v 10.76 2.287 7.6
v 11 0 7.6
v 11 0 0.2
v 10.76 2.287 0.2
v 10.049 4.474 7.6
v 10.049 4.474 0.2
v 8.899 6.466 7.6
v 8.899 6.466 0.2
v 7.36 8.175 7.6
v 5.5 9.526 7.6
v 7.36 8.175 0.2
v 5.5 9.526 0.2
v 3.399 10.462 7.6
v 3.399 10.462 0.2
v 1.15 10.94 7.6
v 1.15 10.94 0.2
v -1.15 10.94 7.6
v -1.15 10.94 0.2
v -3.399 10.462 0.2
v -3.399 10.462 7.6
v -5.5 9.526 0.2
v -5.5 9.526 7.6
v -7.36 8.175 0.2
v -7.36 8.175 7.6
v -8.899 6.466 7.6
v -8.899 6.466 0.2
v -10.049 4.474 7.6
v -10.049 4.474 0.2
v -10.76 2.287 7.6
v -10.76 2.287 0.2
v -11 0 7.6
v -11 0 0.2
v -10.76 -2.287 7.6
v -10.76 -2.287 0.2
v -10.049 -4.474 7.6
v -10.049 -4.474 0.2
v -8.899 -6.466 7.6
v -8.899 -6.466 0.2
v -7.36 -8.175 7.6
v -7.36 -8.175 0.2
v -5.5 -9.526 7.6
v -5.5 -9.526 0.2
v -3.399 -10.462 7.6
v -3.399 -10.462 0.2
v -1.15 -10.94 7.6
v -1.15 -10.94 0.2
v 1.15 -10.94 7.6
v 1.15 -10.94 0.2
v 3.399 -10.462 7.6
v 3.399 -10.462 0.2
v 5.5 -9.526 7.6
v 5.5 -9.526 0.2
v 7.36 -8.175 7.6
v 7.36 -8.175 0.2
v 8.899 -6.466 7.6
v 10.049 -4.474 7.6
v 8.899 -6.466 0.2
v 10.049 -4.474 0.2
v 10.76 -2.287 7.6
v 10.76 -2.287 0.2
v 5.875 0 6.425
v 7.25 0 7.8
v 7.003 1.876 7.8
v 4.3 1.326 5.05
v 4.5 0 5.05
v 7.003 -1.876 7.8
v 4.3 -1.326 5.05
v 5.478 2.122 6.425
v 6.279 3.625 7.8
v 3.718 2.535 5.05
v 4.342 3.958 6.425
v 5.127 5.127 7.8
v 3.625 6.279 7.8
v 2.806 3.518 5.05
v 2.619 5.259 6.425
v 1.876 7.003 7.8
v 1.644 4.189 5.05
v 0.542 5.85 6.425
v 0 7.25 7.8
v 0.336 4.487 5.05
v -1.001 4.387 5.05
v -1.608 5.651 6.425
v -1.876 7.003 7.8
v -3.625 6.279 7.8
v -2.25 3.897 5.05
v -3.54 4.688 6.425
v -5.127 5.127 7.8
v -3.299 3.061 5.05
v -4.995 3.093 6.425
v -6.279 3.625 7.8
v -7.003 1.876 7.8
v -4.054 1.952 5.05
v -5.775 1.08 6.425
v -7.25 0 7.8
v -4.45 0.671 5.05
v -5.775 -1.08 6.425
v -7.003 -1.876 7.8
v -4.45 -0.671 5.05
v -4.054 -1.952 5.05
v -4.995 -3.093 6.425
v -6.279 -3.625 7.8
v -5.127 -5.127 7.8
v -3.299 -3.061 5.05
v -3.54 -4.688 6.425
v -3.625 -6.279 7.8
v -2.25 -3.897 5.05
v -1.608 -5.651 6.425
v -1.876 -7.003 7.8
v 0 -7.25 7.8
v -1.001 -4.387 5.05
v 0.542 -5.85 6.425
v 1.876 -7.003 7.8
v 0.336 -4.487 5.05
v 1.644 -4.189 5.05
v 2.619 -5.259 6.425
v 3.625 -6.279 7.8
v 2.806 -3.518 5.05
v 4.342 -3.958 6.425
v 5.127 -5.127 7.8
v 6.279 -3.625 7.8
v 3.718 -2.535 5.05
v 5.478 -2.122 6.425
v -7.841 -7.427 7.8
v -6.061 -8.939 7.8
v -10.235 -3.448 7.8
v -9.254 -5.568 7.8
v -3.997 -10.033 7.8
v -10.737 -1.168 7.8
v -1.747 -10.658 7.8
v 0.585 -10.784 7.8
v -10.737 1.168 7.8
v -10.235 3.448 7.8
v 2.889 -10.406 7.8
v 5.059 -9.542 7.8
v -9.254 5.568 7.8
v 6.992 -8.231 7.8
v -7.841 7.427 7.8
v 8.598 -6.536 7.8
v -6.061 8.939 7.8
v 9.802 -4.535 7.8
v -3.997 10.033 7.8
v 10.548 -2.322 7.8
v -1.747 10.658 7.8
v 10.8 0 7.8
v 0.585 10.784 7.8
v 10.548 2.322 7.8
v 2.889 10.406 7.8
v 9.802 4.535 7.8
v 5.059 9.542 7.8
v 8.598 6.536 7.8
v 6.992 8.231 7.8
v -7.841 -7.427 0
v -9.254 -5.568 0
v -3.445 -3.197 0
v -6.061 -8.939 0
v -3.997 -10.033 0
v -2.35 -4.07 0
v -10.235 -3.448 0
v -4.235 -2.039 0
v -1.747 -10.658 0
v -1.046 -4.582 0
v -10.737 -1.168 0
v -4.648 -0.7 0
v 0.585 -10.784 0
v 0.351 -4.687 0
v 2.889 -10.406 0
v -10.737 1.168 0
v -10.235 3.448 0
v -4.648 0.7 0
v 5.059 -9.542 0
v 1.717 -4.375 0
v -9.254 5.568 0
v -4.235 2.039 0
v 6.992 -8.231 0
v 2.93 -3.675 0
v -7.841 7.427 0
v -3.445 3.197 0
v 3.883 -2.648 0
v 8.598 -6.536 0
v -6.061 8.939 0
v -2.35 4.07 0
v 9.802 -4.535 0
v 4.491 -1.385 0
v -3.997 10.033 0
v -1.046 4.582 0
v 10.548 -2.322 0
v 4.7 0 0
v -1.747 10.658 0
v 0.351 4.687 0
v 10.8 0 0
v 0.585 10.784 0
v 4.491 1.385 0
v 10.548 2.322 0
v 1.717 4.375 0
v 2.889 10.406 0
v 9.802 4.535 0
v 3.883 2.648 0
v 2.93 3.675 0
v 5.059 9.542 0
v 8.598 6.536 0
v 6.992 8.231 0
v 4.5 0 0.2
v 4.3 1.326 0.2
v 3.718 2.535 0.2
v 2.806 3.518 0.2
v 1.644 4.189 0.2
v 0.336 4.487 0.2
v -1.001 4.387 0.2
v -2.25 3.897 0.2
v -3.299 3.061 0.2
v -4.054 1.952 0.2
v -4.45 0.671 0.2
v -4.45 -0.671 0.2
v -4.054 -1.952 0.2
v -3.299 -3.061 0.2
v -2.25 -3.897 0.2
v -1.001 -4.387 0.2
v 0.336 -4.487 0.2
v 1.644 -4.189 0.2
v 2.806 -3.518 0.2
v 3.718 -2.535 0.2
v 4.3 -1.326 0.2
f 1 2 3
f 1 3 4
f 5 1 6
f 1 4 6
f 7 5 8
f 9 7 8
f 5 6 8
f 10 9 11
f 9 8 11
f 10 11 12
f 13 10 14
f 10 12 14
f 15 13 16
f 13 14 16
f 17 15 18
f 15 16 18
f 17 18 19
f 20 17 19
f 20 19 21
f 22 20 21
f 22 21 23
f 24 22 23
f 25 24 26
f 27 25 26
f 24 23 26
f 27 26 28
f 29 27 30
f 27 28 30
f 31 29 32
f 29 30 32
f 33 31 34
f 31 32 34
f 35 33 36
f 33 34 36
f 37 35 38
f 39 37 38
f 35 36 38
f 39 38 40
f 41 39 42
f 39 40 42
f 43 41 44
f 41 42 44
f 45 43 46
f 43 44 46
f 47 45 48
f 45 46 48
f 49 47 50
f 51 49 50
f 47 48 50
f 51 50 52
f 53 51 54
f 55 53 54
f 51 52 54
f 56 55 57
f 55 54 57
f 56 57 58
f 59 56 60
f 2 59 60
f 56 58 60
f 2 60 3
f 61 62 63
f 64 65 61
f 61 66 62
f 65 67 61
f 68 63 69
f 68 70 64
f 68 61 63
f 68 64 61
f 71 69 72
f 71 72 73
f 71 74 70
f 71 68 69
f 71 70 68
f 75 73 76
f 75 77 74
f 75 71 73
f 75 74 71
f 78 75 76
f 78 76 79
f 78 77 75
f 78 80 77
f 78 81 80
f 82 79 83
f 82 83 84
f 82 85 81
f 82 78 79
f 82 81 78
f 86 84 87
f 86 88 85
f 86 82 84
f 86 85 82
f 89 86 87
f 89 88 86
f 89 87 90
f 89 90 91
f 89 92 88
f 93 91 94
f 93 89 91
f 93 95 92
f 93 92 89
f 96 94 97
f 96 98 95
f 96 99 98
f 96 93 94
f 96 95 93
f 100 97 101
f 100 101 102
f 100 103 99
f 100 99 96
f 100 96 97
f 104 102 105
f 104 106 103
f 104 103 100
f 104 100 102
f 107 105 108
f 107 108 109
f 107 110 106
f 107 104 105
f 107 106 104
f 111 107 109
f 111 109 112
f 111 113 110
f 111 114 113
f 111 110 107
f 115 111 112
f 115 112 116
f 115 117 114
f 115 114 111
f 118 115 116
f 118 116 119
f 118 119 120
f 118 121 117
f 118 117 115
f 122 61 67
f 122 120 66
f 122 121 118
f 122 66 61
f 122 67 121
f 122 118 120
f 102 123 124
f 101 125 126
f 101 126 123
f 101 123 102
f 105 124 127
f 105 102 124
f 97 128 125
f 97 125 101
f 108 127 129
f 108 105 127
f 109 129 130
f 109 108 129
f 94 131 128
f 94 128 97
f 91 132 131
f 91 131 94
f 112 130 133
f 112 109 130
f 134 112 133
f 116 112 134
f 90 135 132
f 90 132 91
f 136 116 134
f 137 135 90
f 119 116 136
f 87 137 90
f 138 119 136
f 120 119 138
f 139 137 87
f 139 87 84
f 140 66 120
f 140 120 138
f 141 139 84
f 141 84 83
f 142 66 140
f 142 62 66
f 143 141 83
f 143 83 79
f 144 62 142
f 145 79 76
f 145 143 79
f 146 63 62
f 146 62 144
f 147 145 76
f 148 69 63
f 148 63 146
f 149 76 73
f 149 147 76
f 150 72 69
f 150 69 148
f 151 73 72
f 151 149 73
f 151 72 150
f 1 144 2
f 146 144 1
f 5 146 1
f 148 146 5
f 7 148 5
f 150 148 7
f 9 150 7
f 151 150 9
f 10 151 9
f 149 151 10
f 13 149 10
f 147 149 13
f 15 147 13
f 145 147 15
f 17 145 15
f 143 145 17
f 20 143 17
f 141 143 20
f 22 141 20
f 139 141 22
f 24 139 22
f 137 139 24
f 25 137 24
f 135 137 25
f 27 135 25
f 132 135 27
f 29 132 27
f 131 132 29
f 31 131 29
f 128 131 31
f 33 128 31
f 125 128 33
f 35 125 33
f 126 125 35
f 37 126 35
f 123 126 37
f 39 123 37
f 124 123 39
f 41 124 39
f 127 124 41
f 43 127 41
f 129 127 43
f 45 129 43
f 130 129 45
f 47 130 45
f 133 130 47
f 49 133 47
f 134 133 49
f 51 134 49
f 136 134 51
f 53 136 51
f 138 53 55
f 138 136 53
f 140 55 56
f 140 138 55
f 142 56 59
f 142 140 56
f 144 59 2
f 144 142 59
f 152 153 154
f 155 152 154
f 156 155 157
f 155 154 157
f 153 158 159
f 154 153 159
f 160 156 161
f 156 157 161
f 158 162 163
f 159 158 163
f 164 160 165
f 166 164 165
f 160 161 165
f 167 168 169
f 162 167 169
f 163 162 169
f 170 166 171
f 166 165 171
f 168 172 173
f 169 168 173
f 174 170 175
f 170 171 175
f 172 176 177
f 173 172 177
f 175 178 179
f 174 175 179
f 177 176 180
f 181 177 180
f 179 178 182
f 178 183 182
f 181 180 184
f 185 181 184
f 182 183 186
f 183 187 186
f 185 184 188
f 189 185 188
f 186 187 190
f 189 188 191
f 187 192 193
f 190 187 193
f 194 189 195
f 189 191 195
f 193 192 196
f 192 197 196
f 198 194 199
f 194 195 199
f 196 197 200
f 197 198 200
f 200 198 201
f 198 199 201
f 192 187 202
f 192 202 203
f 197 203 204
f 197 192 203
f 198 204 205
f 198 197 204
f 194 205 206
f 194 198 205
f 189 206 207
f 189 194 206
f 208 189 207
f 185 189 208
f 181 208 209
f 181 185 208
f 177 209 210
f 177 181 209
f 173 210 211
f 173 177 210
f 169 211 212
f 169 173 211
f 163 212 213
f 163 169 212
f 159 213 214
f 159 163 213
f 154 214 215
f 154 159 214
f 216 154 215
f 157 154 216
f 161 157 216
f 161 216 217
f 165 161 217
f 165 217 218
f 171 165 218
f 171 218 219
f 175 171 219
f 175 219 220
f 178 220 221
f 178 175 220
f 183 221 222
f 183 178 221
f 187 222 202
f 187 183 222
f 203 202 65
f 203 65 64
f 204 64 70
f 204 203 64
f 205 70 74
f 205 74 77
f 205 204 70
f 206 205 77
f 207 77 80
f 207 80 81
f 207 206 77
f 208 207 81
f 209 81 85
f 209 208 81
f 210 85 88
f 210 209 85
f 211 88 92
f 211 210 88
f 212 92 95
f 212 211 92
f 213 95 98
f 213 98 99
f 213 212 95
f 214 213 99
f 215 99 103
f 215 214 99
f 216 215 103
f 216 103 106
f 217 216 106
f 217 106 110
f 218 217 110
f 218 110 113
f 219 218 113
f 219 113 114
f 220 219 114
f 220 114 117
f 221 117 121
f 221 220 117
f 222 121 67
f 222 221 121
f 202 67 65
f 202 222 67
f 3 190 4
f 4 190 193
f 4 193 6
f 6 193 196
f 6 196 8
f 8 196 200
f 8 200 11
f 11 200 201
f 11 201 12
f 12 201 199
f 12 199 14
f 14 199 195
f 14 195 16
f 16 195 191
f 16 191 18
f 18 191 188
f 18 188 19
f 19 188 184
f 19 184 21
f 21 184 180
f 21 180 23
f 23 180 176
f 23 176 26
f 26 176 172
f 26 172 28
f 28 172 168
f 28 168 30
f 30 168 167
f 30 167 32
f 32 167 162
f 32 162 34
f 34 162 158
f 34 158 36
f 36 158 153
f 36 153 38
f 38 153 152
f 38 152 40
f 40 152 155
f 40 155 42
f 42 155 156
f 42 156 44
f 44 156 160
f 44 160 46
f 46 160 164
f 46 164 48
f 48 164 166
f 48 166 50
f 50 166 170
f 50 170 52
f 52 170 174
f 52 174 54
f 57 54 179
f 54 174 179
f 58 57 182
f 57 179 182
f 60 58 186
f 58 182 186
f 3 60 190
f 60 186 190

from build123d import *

# Parameters (mm, degrees)
F0_R     = 11
F0_R_2   = 4.5
F1_DEPTH = 7.8
F2_SIZE  = 0.2
F3_SIZE  = 2.75


with BuildPart() as f1:
    # F0 (on Top) → F1 (new body)
    with BuildSketch(Plane.XY):
        Circle(F0_R)
        Circle(F0_R_2, mode=Mode.SUBTRACT)
    extrude(amount=F1_DEPTH)

    # F2
    f2_edges = [f1.edges().sort_by_distance(p)[0] for p in [
        (-11, 0, 7.8),
        (-11, 0, 0),
        (-4.5, 0, 0),
    ]]
    chamfer(f2_edges, length=F2_SIZE)

    # F3
    f3_edges = [f1.edges().sort_by_distance(p)[0] for p in [
        (-4.5, 0, 7.8),
    ]]
    chamfer(f3_edges, length=F3_SIZE)


solid = f1.part
